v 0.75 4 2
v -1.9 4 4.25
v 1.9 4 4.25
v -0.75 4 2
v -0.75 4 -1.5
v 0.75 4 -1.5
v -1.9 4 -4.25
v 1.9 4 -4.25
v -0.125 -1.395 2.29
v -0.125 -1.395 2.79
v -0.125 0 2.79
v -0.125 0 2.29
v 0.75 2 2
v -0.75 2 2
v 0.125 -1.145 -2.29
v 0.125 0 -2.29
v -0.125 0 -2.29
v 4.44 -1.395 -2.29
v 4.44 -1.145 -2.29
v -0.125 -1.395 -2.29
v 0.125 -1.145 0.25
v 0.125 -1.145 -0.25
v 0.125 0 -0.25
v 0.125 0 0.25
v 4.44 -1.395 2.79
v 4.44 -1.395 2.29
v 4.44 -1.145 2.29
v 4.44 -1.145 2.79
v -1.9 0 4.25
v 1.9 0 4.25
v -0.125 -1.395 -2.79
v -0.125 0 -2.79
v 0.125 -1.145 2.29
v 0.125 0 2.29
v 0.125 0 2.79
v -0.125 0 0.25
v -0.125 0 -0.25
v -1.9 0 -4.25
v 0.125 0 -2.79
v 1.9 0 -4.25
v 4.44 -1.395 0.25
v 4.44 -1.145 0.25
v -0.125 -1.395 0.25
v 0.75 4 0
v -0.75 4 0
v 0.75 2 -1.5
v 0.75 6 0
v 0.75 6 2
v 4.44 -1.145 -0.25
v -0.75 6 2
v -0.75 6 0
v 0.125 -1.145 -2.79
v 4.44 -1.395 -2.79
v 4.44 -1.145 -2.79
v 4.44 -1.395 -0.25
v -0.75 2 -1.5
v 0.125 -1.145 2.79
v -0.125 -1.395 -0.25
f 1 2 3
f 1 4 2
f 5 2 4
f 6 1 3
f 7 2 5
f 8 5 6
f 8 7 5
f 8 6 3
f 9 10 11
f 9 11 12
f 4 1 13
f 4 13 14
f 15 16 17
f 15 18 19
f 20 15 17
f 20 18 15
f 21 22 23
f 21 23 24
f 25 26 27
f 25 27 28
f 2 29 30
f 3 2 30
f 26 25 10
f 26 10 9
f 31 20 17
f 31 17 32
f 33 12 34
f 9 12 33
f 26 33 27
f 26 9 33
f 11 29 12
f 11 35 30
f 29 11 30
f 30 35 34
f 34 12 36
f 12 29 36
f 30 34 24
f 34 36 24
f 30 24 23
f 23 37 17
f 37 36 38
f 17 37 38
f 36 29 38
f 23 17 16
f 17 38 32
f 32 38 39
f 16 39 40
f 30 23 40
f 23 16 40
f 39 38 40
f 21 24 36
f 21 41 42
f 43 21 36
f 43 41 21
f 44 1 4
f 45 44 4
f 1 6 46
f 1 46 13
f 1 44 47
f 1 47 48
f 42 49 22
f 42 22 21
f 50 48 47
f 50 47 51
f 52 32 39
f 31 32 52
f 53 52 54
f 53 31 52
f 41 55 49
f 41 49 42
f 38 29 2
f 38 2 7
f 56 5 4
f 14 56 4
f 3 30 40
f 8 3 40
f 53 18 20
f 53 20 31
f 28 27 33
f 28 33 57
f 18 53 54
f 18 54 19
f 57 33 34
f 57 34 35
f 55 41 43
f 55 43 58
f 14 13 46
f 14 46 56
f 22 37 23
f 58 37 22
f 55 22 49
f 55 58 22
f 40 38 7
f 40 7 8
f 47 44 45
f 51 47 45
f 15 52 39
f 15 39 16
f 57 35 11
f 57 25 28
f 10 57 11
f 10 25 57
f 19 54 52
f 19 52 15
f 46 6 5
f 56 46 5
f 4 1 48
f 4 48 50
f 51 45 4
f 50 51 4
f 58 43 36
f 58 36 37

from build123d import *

# Parameters (mm, degrees)
SKETCH_1_W          = 3.8
SKETCH_1_H          = 8.5
EXTRUDE_1_DEPTH     = 4
SKETCH_2_W          = 1.5
SKETCH_2_H          = 2
EXTRUDE_2_DEPTH     = 2
SKETCH_5_W          = 1.5
SKETCH_5_H          = 3.5
CUT_EXTRUDE_1_DEPTH = 2
SKETCH_7_W          = 0.25
SKETCH_7_H          = 0.5


with BuildPart() as part:
    # 草图1 → 拉伸1 (new body)
    with BuildSketch(Plane(origin=(0, 0, 0), x_dir=(1, 0, 0), z_dir=(0, 1, 0))):
        Rectangle(SKETCH_1_W, SKETCH_1_H)
    extrude(amount=EXTRUDE_1_DEPTH)

    # 草图2 → 拉伸2 (add)
    with BuildSketch(Plane(origin=(0, 4, 0), x_dir=(-1, 0, 0), z_dir=(0, 1, 0))):
        with Locations((0, 1)):
            Rectangle(SKETCH_2_W, SKETCH_2_H)
    extrude(amount=EXTRUDE_2_DEPTH)

    # 草图5 → 切除-拉伸1 (cut)
    with BuildSketch(Plane(origin=(0, 4, 0), x_dir=(-1, 0, 0), z_dir=(0, 1, 0))):
        with Locations((0, 0.25)):
            Rectangle(SKETCH_5_W, SKETCH_5_H)
    extrude(amount=-CUT_EXTRUDE_1_DEPTH, mode=Mode.SUBTRACT)


with BuildPart() as cut_extrude_1_piece_1:
    # of the separate pieces the step leaves, piece 1, a body of its own (cut_extrude_1_pieces)
    add(part.part.solids().sort_by_distance((-1.9, 0, -4.25))[0])

    # 扫描1: sweep along a path in 草图9
    with BuildLine(Plane.XY.offset(4.25)) as sweep_1_path:
        Line((0, 0), (0, -1.27))
        Line((0, -1.27), (4.44, -1.27))
    # 草图7 → 扫描1 (sweep)
    with BuildSketch(Plane.XZ):
        with Locations((0, 2.54)):
            Rectangle(SKETCH_7_W, SKETCH_7_H)
        Rectangle(SKETCH_7_W, SKETCH_7_H)
        with Locations((0, -2.54)):
            Rectangle(SKETCH_7_W, SKETCH_7_H)
    sweep(path=sweep_1_path.line, transition=Transition.RIGHT)


with BuildPart() as cut_extrude_1_piece_2:
    # of the separate pieces the step leaves, piece 2, a body of its own (cut_extrude_1_pieces)
    add(part.part.solids().sort_by_distance((-0.75, 6, 2))[0])


solid = Compound([cut_extrude_1_piece_1.part, cut_extrude_1_piece_2.part])
